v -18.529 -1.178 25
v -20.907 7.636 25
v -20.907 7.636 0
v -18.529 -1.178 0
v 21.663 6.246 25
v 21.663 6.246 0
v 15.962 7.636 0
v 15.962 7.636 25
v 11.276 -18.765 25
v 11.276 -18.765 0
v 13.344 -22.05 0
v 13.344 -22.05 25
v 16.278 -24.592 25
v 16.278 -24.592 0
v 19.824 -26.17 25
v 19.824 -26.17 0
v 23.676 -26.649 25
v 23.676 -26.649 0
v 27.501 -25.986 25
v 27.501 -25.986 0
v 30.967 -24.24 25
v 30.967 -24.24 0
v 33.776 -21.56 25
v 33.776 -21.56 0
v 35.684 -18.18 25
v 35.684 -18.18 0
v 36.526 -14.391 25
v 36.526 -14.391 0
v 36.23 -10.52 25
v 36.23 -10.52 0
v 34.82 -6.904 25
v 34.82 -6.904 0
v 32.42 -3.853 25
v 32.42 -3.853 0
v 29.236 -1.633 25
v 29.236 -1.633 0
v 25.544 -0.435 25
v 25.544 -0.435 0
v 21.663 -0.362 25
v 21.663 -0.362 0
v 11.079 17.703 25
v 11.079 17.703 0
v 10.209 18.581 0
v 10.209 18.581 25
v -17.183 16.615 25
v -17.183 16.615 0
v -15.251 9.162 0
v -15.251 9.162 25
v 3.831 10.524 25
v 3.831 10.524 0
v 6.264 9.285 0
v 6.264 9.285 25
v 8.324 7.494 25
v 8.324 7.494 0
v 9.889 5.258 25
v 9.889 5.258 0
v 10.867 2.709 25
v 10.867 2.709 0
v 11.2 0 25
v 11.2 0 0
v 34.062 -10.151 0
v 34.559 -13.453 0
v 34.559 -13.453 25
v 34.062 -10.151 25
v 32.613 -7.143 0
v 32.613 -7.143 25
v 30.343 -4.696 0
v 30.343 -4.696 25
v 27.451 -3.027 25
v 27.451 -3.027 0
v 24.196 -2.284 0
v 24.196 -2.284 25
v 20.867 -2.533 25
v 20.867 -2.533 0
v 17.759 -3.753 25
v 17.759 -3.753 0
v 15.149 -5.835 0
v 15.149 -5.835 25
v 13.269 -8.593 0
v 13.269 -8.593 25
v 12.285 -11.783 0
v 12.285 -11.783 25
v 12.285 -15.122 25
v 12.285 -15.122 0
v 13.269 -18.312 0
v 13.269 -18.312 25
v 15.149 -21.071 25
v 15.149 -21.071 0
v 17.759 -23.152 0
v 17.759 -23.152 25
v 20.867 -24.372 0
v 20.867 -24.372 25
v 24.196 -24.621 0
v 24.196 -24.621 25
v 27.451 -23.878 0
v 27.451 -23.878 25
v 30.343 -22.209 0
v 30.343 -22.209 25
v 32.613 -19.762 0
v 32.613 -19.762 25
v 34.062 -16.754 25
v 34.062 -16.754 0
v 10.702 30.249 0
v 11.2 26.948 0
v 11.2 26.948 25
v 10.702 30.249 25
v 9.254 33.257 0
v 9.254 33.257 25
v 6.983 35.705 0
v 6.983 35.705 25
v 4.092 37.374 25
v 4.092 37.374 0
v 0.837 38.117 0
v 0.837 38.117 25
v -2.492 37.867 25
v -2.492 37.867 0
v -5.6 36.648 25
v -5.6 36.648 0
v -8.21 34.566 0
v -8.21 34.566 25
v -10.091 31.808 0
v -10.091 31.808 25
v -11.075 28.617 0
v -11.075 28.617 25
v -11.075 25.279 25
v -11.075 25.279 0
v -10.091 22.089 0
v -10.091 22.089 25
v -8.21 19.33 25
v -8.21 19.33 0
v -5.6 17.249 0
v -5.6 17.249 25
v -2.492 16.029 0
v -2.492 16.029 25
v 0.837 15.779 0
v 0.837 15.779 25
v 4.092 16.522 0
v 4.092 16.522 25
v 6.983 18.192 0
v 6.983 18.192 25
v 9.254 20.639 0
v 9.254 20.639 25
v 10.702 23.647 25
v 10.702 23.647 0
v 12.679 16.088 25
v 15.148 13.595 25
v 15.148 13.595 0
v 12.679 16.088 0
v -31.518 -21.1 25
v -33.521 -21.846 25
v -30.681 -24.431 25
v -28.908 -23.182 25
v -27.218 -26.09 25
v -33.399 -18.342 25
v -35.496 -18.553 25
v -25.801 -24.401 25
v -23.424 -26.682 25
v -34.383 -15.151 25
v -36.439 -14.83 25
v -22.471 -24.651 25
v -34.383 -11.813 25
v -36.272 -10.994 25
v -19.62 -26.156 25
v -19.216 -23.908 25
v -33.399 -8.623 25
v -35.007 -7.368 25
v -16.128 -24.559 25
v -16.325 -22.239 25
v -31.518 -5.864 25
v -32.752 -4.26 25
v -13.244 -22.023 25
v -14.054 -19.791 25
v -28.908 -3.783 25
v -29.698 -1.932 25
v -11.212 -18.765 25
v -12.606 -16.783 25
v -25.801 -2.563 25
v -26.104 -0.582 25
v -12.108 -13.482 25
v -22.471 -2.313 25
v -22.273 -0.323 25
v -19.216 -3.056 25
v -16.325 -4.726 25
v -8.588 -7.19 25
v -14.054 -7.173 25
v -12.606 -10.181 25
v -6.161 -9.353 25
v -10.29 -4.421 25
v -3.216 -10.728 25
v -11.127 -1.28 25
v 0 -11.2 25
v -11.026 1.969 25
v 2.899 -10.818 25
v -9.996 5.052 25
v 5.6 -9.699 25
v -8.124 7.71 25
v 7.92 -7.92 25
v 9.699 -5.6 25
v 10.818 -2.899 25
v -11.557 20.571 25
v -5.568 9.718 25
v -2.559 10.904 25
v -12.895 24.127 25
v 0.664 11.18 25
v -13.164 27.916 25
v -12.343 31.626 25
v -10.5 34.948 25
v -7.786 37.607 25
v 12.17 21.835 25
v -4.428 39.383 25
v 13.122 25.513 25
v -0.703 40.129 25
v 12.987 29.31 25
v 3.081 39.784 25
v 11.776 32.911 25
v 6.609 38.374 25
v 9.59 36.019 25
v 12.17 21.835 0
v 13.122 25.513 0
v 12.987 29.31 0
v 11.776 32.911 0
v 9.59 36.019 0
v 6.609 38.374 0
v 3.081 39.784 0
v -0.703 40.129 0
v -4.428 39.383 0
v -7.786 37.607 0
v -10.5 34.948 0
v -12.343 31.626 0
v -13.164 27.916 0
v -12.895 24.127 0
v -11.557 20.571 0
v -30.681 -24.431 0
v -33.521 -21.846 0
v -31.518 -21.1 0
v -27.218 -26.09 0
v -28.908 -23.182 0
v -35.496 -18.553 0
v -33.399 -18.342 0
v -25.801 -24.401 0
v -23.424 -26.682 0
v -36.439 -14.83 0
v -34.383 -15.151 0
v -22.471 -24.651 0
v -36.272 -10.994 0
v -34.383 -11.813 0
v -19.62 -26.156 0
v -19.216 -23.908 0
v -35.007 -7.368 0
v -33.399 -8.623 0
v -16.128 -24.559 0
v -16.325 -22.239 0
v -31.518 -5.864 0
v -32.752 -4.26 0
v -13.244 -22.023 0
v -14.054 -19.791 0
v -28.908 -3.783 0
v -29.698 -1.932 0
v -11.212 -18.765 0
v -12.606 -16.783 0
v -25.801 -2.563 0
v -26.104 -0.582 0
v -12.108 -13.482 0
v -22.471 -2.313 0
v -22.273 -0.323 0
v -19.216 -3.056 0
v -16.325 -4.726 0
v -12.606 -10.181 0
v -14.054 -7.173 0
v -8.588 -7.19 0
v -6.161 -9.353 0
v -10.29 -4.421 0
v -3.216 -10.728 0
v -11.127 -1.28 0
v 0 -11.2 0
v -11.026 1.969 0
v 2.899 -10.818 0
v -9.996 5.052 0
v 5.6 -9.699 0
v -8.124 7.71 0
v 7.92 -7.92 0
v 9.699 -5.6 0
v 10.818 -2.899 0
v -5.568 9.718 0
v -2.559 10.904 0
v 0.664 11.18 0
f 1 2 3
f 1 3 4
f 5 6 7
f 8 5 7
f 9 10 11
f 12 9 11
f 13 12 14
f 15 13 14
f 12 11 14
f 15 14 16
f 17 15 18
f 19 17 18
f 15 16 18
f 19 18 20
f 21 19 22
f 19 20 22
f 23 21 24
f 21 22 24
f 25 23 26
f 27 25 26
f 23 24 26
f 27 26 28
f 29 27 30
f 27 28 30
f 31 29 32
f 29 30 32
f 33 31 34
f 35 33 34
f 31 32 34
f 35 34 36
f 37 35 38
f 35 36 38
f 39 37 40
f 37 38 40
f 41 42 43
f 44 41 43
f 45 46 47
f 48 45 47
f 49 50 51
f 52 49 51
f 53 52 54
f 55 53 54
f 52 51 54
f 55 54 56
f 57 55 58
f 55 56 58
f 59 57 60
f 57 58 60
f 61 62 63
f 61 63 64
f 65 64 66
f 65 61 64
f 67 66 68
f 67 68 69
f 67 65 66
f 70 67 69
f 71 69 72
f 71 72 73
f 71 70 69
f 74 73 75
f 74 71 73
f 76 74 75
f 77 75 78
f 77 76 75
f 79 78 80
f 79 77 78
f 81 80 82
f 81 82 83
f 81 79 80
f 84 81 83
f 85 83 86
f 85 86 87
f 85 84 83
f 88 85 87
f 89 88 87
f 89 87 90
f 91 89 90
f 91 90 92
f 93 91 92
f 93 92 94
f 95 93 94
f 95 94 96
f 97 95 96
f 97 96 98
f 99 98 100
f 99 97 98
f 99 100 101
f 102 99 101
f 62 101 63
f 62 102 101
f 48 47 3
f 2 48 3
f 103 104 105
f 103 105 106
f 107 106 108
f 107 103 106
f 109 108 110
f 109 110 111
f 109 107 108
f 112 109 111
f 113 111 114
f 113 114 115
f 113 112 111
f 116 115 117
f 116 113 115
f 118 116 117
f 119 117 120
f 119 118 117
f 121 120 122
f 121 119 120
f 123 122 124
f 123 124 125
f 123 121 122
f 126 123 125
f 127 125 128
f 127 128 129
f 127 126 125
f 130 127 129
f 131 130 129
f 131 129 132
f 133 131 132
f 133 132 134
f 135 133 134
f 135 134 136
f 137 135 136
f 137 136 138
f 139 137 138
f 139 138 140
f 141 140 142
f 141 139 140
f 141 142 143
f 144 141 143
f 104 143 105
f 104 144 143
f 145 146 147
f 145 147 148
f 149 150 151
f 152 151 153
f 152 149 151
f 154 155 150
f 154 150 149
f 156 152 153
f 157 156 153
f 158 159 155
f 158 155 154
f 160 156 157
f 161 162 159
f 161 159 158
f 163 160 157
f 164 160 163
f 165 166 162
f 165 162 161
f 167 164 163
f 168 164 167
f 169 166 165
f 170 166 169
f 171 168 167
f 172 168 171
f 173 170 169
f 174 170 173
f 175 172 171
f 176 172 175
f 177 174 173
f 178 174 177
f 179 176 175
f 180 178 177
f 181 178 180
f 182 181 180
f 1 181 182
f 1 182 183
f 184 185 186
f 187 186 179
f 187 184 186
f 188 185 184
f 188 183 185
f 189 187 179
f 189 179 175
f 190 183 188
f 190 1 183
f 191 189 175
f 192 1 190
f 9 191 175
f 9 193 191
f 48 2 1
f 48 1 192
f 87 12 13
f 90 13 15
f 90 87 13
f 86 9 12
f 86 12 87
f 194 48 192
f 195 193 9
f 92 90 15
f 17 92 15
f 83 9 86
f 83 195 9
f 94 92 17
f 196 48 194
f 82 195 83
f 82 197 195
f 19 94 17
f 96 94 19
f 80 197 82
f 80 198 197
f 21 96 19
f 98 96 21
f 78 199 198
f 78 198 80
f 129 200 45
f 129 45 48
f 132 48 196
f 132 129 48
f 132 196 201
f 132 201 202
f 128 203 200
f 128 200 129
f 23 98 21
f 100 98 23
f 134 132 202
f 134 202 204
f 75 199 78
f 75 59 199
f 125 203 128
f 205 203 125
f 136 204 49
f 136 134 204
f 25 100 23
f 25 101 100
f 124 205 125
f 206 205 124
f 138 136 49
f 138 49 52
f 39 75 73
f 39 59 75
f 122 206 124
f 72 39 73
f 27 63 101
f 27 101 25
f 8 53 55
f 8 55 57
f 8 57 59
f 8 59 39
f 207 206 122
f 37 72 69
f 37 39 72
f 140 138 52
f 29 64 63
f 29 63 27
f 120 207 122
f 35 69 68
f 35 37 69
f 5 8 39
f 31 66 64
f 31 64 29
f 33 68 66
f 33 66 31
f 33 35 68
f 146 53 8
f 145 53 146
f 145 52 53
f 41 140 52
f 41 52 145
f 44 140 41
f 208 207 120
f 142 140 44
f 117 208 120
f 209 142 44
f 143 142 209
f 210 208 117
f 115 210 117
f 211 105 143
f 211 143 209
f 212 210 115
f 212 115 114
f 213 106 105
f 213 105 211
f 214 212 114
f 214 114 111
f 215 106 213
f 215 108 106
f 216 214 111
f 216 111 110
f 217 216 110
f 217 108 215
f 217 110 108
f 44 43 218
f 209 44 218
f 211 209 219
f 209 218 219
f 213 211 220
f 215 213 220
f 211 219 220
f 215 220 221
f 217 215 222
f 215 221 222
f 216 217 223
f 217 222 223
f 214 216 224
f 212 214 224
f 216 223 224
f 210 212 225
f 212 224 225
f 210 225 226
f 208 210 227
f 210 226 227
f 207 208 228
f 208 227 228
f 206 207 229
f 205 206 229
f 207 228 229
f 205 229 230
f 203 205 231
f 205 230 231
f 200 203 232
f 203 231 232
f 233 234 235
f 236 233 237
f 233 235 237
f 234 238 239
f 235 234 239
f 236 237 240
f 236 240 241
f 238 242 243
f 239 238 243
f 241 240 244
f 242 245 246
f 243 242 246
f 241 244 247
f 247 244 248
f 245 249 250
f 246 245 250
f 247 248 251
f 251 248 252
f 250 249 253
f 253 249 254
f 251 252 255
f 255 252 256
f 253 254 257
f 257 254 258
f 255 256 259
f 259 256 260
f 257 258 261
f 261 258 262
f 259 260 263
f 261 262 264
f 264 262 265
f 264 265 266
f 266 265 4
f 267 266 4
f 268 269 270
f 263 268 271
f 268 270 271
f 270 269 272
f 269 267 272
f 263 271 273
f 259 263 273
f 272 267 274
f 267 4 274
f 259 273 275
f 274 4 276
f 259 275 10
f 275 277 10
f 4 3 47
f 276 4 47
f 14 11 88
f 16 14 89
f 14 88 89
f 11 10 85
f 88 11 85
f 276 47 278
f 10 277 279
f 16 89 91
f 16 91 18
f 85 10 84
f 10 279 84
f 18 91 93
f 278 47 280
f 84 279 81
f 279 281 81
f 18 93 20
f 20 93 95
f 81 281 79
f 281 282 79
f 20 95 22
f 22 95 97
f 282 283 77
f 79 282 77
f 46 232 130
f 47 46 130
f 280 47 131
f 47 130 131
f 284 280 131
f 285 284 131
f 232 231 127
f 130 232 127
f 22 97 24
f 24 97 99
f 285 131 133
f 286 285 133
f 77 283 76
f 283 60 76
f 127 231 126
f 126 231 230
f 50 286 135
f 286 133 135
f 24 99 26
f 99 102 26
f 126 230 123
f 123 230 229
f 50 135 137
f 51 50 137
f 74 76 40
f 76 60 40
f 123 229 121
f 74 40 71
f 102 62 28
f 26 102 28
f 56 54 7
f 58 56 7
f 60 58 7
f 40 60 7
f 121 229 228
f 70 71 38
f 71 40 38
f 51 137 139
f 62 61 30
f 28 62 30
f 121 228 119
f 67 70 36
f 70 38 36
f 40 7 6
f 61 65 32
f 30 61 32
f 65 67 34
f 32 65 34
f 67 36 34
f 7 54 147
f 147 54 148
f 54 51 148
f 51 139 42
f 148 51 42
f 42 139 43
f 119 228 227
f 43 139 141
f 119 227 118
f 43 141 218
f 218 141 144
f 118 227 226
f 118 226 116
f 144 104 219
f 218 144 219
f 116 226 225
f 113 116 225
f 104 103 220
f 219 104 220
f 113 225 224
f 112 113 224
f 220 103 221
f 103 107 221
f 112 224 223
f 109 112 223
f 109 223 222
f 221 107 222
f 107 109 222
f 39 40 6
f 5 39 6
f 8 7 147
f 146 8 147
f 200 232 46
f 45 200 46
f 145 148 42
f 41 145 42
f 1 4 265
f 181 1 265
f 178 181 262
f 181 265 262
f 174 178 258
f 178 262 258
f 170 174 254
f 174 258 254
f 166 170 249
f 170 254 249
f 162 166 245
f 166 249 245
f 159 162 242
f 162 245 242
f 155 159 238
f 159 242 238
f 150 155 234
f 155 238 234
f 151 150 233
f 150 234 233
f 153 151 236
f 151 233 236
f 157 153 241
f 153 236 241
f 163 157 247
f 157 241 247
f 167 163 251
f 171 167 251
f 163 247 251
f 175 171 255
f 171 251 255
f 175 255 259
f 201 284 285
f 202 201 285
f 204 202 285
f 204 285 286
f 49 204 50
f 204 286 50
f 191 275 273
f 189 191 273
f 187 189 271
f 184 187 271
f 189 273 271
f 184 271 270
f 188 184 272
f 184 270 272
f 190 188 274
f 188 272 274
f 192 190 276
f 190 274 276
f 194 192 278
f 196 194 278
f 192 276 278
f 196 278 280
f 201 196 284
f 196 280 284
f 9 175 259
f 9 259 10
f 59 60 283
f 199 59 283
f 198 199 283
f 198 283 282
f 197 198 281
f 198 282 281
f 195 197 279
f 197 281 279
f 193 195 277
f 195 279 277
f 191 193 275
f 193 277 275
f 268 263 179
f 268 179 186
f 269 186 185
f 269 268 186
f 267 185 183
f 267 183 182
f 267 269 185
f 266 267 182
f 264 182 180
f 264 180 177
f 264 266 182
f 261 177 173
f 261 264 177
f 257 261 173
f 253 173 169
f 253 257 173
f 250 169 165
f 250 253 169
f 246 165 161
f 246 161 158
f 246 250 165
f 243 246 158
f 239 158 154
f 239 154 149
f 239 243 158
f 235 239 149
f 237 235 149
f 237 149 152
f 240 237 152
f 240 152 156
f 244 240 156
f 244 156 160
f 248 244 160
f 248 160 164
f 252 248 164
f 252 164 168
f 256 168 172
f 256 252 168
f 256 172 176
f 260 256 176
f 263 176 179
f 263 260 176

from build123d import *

# Parameters (mm, degrees)
F0_R     = 11.2
F1_DEPTH = 25


with BuildPart() as f1:
    # F0 (on Top) → F1 (new body)
    with BuildSketch(Plane.XY):
        with BuildLine():
            ThreePointArc((3.831396, 10.524277), (9.174738, 6.42372), (11.2, 0))
            ThreePointArc((11.2, 0), (7.919596, -7.919596), (0, -11.2))
            Line((0, -11.2), (1.961414, -18.765441))
            Line((1.961414, -18.765441), (11.275878, -18.765441))
            ThreePointArc((11.275878, -18.765441), (34.854913, -19.940638), (21.662812, -0.362067))
            Line((21.662812, -0.362067), (21.662812, 6.24599))
            Line((21.662812, 6.24599), (15.962205, 7.635998))
            Line((15.962205, 7.635998), (15.147737, 13.595152))
            Line((15.147737, 13.595152), (12.678516, 16.088038))
            Line((12.678516, 16.088038), (11.0789, 17.702983))
            Line((11.0789, 17.702983), (3.831396, 10.524277))
        make_face()
        with Locations((23.359479, -13.452572)):
            Circle(F0_R, mode=Mode.SUBTRACT)
        with BuildLine():
            ThreePointArc((-5.568315, 9.717709), (-0.957528, 11.158994), (3.831396, 10.524277))
            Line((3.831396, 10.524277), (11.0789, 17.702983))
            Line((11.0789, 17.702983), (10.209294, 18.580924))
            ThreePointArc((10.209294, 18.580924), (1.201666, 40.09333), (-11.557174, 20.570703))
            Line((-11.557174, 20.570703), (-5.568315, 9.717709))
        make_face()
        with Locations((0, 26.948141)):
            Circle(F0_R, mode=Mode.SUBTRACT)
        with BuildLine():
            Line((1.961414, -18.765441), (0, -11.2))
            ThreePointArc((0, -11.2), (-10.823085, -2.881116), (-5.568315, 9.717709))
            Line((-5.568315, 9.717709), (-11.557174, 20.570703))
            Line((-11.557174, 20.570703), (-17.183078, 16.615154))
            Line((-17.183078, 16.615154), (-15.250741, 9.161863))
            Line((-15.250741, 9.161863), (-20.906688, 7.635998))
            Line((-20.906688, 7.635998), (-18.528908, -1.177754))
            ThreePointArc((-18.528908, -1.177754), (-35.495636, -18.552516), (-11.211755, -18.765441))
            Line((-11.211755, -18.765441), (1.961414, -18.765441))
        make_face()
        with Locations((-23.308304, -13.482118)):
            Circle(F0_R, mode=Mode.SUBTRACT)
    extrude(amount=F1_DEPTH)


solid = f1.part
